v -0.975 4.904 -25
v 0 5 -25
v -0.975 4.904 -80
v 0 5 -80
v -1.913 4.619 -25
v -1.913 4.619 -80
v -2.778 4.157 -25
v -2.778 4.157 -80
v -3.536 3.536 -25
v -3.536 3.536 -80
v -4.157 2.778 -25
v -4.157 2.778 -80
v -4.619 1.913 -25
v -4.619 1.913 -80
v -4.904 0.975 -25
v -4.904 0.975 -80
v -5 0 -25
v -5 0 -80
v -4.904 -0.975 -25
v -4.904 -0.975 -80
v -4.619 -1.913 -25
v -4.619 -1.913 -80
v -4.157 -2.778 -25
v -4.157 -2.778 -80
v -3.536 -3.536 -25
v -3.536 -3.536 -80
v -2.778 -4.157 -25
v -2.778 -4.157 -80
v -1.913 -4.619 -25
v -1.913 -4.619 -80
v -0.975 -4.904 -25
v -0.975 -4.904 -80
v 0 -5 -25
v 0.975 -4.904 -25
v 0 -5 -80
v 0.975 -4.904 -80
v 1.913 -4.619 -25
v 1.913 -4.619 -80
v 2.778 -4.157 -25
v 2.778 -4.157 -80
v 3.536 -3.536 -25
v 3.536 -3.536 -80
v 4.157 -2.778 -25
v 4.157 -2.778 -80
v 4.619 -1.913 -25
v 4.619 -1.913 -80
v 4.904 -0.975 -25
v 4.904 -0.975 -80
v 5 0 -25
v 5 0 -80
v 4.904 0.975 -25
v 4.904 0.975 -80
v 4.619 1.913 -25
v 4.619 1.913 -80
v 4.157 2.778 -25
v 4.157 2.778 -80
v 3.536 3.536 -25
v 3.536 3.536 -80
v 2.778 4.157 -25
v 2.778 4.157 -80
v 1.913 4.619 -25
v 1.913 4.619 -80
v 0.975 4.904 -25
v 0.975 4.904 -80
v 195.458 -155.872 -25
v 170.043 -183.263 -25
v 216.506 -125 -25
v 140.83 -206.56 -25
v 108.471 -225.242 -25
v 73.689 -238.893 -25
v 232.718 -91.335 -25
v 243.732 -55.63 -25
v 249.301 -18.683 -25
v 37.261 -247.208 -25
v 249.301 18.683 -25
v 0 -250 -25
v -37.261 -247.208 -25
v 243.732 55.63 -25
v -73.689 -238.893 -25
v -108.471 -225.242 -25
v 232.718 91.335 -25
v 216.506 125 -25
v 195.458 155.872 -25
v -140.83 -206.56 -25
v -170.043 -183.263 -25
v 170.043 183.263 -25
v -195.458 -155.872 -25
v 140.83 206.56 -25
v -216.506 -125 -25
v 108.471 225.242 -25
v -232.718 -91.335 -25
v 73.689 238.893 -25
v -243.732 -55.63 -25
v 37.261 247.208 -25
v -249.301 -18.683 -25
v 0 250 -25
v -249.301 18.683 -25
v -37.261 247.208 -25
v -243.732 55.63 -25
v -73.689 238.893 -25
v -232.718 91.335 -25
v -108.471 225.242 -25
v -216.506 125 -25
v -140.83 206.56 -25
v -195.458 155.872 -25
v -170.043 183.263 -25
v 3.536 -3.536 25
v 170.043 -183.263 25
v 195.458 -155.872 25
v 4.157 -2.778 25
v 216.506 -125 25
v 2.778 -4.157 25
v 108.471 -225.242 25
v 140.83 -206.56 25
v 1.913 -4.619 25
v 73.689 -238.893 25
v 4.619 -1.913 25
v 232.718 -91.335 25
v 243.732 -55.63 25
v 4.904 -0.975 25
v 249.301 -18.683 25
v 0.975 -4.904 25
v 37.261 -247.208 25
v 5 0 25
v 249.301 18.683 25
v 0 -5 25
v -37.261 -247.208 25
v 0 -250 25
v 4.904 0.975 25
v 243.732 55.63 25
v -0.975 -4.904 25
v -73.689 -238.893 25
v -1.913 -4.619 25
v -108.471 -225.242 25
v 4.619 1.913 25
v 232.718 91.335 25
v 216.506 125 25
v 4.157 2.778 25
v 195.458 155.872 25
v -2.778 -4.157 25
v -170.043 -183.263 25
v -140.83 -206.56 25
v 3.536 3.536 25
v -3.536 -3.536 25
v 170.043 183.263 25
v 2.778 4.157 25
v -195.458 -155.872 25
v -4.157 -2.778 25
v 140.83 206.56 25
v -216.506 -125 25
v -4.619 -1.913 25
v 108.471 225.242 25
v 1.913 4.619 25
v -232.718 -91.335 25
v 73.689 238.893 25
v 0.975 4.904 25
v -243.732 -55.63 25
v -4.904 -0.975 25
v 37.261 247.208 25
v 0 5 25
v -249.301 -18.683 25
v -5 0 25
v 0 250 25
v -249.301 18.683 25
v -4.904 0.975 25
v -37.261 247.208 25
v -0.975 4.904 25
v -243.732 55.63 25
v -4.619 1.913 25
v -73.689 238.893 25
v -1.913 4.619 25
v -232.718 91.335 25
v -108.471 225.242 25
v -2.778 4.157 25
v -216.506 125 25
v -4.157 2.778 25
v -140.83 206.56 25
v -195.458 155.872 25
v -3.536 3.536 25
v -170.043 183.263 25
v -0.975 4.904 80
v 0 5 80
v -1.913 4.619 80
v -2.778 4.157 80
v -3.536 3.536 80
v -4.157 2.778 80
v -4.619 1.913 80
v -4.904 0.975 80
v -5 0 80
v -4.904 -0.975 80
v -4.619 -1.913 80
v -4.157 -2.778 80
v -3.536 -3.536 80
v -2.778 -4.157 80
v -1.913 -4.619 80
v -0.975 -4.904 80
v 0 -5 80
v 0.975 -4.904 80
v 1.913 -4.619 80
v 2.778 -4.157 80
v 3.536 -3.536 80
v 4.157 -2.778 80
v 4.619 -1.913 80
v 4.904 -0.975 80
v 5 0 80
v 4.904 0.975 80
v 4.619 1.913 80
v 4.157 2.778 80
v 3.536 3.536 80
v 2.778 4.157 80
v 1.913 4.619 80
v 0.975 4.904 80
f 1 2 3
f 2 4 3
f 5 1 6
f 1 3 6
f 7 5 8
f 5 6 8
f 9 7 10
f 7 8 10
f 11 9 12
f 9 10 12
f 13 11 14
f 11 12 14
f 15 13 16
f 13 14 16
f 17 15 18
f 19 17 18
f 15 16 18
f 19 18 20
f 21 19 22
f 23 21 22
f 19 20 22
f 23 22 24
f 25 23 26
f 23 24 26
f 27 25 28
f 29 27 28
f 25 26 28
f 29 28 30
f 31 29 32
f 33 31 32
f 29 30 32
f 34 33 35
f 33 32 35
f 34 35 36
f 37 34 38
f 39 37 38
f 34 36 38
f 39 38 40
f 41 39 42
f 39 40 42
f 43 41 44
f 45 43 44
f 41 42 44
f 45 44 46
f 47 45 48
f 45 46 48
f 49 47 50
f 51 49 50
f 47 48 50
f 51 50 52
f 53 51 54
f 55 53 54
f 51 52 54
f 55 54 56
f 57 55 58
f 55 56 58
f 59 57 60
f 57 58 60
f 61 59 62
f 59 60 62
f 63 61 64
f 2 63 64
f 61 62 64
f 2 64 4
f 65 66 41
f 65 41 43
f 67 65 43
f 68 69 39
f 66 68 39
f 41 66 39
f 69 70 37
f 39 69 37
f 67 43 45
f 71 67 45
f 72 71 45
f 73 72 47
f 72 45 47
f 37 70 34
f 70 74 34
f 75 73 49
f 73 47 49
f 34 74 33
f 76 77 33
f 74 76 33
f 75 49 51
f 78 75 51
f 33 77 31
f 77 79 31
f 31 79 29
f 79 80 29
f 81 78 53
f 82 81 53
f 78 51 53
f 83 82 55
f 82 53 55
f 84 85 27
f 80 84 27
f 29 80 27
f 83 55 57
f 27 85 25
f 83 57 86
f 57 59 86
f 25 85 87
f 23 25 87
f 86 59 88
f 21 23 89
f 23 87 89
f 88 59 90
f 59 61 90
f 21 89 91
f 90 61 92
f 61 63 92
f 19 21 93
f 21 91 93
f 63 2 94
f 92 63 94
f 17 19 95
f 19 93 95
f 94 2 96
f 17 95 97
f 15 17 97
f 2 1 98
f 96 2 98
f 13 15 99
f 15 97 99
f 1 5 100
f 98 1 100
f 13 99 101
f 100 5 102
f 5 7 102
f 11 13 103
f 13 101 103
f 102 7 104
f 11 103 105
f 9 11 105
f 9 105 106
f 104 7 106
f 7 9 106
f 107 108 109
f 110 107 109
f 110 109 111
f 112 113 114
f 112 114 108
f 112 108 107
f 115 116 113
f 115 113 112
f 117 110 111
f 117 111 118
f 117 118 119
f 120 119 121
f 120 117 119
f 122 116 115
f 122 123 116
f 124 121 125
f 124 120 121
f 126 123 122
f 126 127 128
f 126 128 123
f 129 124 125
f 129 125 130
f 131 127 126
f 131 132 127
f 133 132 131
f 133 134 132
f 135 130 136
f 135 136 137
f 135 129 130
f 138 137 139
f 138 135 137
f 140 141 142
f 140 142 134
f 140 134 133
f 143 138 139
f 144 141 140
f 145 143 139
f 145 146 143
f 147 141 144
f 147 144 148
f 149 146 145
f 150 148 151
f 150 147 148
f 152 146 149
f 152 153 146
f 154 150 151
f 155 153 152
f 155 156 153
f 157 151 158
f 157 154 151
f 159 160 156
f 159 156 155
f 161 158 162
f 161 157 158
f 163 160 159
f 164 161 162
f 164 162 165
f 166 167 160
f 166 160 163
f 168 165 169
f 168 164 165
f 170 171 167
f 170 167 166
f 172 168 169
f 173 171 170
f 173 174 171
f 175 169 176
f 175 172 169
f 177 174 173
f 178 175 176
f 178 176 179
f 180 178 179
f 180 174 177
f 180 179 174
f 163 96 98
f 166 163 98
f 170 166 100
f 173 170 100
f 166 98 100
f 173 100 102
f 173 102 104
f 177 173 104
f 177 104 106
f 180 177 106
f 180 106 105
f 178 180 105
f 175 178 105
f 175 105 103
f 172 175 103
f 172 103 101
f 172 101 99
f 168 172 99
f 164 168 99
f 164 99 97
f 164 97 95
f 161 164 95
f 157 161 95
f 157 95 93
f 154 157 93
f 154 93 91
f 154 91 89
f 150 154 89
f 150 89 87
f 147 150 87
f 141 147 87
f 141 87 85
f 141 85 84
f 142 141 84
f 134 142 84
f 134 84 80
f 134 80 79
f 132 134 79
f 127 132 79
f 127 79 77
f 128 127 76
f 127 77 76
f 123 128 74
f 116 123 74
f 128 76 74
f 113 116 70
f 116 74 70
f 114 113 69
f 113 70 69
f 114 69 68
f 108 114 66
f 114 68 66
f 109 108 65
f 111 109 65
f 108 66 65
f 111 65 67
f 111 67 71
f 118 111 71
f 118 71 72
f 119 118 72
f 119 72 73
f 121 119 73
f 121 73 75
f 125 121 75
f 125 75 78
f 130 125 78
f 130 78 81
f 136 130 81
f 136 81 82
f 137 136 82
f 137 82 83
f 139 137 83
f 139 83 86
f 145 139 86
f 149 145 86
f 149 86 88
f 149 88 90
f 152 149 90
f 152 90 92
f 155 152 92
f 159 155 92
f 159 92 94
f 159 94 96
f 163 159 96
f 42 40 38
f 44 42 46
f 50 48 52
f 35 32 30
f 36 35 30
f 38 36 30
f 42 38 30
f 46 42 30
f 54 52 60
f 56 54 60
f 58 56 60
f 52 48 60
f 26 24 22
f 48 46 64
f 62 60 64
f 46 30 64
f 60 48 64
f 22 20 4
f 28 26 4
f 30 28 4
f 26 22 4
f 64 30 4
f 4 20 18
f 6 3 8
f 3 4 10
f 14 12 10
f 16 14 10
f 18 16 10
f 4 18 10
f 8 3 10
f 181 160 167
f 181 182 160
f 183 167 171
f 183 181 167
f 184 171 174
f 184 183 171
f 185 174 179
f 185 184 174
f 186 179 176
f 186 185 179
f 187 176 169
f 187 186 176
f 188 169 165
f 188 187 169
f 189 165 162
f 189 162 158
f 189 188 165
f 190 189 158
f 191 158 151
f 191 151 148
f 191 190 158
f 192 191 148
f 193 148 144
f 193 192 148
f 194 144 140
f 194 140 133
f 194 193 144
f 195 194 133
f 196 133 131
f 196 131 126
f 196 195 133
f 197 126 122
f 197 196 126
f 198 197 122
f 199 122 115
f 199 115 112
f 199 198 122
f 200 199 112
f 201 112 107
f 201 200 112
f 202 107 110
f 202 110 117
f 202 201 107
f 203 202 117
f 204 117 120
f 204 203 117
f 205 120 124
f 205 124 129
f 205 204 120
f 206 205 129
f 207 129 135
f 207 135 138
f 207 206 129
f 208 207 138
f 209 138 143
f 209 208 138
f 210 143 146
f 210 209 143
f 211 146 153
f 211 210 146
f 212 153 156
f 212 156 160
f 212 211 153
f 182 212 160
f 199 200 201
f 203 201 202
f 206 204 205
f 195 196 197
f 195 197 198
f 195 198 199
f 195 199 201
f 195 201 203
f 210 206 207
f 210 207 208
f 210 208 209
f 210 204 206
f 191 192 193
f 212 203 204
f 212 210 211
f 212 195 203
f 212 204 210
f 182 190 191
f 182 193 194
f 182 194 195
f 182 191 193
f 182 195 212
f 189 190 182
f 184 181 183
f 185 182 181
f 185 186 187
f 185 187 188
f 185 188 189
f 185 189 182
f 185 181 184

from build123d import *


with BuildPart() as part:
    # Sketch → Revolution (revolve)
    with BuildSketch(Plane.YZ):
        Polygon((250, 0), (250, 25), (5, 25), (5, 80), (0, 80), (0, 0), align=None)
    revolution = revolve(axis=Axis((0, 0, 0), (0, 0, 1)))

    # Mirrored: Revolution across Sketch H_Axis
    add(revolution.mirror(Plane.XY))


solid = part.part
